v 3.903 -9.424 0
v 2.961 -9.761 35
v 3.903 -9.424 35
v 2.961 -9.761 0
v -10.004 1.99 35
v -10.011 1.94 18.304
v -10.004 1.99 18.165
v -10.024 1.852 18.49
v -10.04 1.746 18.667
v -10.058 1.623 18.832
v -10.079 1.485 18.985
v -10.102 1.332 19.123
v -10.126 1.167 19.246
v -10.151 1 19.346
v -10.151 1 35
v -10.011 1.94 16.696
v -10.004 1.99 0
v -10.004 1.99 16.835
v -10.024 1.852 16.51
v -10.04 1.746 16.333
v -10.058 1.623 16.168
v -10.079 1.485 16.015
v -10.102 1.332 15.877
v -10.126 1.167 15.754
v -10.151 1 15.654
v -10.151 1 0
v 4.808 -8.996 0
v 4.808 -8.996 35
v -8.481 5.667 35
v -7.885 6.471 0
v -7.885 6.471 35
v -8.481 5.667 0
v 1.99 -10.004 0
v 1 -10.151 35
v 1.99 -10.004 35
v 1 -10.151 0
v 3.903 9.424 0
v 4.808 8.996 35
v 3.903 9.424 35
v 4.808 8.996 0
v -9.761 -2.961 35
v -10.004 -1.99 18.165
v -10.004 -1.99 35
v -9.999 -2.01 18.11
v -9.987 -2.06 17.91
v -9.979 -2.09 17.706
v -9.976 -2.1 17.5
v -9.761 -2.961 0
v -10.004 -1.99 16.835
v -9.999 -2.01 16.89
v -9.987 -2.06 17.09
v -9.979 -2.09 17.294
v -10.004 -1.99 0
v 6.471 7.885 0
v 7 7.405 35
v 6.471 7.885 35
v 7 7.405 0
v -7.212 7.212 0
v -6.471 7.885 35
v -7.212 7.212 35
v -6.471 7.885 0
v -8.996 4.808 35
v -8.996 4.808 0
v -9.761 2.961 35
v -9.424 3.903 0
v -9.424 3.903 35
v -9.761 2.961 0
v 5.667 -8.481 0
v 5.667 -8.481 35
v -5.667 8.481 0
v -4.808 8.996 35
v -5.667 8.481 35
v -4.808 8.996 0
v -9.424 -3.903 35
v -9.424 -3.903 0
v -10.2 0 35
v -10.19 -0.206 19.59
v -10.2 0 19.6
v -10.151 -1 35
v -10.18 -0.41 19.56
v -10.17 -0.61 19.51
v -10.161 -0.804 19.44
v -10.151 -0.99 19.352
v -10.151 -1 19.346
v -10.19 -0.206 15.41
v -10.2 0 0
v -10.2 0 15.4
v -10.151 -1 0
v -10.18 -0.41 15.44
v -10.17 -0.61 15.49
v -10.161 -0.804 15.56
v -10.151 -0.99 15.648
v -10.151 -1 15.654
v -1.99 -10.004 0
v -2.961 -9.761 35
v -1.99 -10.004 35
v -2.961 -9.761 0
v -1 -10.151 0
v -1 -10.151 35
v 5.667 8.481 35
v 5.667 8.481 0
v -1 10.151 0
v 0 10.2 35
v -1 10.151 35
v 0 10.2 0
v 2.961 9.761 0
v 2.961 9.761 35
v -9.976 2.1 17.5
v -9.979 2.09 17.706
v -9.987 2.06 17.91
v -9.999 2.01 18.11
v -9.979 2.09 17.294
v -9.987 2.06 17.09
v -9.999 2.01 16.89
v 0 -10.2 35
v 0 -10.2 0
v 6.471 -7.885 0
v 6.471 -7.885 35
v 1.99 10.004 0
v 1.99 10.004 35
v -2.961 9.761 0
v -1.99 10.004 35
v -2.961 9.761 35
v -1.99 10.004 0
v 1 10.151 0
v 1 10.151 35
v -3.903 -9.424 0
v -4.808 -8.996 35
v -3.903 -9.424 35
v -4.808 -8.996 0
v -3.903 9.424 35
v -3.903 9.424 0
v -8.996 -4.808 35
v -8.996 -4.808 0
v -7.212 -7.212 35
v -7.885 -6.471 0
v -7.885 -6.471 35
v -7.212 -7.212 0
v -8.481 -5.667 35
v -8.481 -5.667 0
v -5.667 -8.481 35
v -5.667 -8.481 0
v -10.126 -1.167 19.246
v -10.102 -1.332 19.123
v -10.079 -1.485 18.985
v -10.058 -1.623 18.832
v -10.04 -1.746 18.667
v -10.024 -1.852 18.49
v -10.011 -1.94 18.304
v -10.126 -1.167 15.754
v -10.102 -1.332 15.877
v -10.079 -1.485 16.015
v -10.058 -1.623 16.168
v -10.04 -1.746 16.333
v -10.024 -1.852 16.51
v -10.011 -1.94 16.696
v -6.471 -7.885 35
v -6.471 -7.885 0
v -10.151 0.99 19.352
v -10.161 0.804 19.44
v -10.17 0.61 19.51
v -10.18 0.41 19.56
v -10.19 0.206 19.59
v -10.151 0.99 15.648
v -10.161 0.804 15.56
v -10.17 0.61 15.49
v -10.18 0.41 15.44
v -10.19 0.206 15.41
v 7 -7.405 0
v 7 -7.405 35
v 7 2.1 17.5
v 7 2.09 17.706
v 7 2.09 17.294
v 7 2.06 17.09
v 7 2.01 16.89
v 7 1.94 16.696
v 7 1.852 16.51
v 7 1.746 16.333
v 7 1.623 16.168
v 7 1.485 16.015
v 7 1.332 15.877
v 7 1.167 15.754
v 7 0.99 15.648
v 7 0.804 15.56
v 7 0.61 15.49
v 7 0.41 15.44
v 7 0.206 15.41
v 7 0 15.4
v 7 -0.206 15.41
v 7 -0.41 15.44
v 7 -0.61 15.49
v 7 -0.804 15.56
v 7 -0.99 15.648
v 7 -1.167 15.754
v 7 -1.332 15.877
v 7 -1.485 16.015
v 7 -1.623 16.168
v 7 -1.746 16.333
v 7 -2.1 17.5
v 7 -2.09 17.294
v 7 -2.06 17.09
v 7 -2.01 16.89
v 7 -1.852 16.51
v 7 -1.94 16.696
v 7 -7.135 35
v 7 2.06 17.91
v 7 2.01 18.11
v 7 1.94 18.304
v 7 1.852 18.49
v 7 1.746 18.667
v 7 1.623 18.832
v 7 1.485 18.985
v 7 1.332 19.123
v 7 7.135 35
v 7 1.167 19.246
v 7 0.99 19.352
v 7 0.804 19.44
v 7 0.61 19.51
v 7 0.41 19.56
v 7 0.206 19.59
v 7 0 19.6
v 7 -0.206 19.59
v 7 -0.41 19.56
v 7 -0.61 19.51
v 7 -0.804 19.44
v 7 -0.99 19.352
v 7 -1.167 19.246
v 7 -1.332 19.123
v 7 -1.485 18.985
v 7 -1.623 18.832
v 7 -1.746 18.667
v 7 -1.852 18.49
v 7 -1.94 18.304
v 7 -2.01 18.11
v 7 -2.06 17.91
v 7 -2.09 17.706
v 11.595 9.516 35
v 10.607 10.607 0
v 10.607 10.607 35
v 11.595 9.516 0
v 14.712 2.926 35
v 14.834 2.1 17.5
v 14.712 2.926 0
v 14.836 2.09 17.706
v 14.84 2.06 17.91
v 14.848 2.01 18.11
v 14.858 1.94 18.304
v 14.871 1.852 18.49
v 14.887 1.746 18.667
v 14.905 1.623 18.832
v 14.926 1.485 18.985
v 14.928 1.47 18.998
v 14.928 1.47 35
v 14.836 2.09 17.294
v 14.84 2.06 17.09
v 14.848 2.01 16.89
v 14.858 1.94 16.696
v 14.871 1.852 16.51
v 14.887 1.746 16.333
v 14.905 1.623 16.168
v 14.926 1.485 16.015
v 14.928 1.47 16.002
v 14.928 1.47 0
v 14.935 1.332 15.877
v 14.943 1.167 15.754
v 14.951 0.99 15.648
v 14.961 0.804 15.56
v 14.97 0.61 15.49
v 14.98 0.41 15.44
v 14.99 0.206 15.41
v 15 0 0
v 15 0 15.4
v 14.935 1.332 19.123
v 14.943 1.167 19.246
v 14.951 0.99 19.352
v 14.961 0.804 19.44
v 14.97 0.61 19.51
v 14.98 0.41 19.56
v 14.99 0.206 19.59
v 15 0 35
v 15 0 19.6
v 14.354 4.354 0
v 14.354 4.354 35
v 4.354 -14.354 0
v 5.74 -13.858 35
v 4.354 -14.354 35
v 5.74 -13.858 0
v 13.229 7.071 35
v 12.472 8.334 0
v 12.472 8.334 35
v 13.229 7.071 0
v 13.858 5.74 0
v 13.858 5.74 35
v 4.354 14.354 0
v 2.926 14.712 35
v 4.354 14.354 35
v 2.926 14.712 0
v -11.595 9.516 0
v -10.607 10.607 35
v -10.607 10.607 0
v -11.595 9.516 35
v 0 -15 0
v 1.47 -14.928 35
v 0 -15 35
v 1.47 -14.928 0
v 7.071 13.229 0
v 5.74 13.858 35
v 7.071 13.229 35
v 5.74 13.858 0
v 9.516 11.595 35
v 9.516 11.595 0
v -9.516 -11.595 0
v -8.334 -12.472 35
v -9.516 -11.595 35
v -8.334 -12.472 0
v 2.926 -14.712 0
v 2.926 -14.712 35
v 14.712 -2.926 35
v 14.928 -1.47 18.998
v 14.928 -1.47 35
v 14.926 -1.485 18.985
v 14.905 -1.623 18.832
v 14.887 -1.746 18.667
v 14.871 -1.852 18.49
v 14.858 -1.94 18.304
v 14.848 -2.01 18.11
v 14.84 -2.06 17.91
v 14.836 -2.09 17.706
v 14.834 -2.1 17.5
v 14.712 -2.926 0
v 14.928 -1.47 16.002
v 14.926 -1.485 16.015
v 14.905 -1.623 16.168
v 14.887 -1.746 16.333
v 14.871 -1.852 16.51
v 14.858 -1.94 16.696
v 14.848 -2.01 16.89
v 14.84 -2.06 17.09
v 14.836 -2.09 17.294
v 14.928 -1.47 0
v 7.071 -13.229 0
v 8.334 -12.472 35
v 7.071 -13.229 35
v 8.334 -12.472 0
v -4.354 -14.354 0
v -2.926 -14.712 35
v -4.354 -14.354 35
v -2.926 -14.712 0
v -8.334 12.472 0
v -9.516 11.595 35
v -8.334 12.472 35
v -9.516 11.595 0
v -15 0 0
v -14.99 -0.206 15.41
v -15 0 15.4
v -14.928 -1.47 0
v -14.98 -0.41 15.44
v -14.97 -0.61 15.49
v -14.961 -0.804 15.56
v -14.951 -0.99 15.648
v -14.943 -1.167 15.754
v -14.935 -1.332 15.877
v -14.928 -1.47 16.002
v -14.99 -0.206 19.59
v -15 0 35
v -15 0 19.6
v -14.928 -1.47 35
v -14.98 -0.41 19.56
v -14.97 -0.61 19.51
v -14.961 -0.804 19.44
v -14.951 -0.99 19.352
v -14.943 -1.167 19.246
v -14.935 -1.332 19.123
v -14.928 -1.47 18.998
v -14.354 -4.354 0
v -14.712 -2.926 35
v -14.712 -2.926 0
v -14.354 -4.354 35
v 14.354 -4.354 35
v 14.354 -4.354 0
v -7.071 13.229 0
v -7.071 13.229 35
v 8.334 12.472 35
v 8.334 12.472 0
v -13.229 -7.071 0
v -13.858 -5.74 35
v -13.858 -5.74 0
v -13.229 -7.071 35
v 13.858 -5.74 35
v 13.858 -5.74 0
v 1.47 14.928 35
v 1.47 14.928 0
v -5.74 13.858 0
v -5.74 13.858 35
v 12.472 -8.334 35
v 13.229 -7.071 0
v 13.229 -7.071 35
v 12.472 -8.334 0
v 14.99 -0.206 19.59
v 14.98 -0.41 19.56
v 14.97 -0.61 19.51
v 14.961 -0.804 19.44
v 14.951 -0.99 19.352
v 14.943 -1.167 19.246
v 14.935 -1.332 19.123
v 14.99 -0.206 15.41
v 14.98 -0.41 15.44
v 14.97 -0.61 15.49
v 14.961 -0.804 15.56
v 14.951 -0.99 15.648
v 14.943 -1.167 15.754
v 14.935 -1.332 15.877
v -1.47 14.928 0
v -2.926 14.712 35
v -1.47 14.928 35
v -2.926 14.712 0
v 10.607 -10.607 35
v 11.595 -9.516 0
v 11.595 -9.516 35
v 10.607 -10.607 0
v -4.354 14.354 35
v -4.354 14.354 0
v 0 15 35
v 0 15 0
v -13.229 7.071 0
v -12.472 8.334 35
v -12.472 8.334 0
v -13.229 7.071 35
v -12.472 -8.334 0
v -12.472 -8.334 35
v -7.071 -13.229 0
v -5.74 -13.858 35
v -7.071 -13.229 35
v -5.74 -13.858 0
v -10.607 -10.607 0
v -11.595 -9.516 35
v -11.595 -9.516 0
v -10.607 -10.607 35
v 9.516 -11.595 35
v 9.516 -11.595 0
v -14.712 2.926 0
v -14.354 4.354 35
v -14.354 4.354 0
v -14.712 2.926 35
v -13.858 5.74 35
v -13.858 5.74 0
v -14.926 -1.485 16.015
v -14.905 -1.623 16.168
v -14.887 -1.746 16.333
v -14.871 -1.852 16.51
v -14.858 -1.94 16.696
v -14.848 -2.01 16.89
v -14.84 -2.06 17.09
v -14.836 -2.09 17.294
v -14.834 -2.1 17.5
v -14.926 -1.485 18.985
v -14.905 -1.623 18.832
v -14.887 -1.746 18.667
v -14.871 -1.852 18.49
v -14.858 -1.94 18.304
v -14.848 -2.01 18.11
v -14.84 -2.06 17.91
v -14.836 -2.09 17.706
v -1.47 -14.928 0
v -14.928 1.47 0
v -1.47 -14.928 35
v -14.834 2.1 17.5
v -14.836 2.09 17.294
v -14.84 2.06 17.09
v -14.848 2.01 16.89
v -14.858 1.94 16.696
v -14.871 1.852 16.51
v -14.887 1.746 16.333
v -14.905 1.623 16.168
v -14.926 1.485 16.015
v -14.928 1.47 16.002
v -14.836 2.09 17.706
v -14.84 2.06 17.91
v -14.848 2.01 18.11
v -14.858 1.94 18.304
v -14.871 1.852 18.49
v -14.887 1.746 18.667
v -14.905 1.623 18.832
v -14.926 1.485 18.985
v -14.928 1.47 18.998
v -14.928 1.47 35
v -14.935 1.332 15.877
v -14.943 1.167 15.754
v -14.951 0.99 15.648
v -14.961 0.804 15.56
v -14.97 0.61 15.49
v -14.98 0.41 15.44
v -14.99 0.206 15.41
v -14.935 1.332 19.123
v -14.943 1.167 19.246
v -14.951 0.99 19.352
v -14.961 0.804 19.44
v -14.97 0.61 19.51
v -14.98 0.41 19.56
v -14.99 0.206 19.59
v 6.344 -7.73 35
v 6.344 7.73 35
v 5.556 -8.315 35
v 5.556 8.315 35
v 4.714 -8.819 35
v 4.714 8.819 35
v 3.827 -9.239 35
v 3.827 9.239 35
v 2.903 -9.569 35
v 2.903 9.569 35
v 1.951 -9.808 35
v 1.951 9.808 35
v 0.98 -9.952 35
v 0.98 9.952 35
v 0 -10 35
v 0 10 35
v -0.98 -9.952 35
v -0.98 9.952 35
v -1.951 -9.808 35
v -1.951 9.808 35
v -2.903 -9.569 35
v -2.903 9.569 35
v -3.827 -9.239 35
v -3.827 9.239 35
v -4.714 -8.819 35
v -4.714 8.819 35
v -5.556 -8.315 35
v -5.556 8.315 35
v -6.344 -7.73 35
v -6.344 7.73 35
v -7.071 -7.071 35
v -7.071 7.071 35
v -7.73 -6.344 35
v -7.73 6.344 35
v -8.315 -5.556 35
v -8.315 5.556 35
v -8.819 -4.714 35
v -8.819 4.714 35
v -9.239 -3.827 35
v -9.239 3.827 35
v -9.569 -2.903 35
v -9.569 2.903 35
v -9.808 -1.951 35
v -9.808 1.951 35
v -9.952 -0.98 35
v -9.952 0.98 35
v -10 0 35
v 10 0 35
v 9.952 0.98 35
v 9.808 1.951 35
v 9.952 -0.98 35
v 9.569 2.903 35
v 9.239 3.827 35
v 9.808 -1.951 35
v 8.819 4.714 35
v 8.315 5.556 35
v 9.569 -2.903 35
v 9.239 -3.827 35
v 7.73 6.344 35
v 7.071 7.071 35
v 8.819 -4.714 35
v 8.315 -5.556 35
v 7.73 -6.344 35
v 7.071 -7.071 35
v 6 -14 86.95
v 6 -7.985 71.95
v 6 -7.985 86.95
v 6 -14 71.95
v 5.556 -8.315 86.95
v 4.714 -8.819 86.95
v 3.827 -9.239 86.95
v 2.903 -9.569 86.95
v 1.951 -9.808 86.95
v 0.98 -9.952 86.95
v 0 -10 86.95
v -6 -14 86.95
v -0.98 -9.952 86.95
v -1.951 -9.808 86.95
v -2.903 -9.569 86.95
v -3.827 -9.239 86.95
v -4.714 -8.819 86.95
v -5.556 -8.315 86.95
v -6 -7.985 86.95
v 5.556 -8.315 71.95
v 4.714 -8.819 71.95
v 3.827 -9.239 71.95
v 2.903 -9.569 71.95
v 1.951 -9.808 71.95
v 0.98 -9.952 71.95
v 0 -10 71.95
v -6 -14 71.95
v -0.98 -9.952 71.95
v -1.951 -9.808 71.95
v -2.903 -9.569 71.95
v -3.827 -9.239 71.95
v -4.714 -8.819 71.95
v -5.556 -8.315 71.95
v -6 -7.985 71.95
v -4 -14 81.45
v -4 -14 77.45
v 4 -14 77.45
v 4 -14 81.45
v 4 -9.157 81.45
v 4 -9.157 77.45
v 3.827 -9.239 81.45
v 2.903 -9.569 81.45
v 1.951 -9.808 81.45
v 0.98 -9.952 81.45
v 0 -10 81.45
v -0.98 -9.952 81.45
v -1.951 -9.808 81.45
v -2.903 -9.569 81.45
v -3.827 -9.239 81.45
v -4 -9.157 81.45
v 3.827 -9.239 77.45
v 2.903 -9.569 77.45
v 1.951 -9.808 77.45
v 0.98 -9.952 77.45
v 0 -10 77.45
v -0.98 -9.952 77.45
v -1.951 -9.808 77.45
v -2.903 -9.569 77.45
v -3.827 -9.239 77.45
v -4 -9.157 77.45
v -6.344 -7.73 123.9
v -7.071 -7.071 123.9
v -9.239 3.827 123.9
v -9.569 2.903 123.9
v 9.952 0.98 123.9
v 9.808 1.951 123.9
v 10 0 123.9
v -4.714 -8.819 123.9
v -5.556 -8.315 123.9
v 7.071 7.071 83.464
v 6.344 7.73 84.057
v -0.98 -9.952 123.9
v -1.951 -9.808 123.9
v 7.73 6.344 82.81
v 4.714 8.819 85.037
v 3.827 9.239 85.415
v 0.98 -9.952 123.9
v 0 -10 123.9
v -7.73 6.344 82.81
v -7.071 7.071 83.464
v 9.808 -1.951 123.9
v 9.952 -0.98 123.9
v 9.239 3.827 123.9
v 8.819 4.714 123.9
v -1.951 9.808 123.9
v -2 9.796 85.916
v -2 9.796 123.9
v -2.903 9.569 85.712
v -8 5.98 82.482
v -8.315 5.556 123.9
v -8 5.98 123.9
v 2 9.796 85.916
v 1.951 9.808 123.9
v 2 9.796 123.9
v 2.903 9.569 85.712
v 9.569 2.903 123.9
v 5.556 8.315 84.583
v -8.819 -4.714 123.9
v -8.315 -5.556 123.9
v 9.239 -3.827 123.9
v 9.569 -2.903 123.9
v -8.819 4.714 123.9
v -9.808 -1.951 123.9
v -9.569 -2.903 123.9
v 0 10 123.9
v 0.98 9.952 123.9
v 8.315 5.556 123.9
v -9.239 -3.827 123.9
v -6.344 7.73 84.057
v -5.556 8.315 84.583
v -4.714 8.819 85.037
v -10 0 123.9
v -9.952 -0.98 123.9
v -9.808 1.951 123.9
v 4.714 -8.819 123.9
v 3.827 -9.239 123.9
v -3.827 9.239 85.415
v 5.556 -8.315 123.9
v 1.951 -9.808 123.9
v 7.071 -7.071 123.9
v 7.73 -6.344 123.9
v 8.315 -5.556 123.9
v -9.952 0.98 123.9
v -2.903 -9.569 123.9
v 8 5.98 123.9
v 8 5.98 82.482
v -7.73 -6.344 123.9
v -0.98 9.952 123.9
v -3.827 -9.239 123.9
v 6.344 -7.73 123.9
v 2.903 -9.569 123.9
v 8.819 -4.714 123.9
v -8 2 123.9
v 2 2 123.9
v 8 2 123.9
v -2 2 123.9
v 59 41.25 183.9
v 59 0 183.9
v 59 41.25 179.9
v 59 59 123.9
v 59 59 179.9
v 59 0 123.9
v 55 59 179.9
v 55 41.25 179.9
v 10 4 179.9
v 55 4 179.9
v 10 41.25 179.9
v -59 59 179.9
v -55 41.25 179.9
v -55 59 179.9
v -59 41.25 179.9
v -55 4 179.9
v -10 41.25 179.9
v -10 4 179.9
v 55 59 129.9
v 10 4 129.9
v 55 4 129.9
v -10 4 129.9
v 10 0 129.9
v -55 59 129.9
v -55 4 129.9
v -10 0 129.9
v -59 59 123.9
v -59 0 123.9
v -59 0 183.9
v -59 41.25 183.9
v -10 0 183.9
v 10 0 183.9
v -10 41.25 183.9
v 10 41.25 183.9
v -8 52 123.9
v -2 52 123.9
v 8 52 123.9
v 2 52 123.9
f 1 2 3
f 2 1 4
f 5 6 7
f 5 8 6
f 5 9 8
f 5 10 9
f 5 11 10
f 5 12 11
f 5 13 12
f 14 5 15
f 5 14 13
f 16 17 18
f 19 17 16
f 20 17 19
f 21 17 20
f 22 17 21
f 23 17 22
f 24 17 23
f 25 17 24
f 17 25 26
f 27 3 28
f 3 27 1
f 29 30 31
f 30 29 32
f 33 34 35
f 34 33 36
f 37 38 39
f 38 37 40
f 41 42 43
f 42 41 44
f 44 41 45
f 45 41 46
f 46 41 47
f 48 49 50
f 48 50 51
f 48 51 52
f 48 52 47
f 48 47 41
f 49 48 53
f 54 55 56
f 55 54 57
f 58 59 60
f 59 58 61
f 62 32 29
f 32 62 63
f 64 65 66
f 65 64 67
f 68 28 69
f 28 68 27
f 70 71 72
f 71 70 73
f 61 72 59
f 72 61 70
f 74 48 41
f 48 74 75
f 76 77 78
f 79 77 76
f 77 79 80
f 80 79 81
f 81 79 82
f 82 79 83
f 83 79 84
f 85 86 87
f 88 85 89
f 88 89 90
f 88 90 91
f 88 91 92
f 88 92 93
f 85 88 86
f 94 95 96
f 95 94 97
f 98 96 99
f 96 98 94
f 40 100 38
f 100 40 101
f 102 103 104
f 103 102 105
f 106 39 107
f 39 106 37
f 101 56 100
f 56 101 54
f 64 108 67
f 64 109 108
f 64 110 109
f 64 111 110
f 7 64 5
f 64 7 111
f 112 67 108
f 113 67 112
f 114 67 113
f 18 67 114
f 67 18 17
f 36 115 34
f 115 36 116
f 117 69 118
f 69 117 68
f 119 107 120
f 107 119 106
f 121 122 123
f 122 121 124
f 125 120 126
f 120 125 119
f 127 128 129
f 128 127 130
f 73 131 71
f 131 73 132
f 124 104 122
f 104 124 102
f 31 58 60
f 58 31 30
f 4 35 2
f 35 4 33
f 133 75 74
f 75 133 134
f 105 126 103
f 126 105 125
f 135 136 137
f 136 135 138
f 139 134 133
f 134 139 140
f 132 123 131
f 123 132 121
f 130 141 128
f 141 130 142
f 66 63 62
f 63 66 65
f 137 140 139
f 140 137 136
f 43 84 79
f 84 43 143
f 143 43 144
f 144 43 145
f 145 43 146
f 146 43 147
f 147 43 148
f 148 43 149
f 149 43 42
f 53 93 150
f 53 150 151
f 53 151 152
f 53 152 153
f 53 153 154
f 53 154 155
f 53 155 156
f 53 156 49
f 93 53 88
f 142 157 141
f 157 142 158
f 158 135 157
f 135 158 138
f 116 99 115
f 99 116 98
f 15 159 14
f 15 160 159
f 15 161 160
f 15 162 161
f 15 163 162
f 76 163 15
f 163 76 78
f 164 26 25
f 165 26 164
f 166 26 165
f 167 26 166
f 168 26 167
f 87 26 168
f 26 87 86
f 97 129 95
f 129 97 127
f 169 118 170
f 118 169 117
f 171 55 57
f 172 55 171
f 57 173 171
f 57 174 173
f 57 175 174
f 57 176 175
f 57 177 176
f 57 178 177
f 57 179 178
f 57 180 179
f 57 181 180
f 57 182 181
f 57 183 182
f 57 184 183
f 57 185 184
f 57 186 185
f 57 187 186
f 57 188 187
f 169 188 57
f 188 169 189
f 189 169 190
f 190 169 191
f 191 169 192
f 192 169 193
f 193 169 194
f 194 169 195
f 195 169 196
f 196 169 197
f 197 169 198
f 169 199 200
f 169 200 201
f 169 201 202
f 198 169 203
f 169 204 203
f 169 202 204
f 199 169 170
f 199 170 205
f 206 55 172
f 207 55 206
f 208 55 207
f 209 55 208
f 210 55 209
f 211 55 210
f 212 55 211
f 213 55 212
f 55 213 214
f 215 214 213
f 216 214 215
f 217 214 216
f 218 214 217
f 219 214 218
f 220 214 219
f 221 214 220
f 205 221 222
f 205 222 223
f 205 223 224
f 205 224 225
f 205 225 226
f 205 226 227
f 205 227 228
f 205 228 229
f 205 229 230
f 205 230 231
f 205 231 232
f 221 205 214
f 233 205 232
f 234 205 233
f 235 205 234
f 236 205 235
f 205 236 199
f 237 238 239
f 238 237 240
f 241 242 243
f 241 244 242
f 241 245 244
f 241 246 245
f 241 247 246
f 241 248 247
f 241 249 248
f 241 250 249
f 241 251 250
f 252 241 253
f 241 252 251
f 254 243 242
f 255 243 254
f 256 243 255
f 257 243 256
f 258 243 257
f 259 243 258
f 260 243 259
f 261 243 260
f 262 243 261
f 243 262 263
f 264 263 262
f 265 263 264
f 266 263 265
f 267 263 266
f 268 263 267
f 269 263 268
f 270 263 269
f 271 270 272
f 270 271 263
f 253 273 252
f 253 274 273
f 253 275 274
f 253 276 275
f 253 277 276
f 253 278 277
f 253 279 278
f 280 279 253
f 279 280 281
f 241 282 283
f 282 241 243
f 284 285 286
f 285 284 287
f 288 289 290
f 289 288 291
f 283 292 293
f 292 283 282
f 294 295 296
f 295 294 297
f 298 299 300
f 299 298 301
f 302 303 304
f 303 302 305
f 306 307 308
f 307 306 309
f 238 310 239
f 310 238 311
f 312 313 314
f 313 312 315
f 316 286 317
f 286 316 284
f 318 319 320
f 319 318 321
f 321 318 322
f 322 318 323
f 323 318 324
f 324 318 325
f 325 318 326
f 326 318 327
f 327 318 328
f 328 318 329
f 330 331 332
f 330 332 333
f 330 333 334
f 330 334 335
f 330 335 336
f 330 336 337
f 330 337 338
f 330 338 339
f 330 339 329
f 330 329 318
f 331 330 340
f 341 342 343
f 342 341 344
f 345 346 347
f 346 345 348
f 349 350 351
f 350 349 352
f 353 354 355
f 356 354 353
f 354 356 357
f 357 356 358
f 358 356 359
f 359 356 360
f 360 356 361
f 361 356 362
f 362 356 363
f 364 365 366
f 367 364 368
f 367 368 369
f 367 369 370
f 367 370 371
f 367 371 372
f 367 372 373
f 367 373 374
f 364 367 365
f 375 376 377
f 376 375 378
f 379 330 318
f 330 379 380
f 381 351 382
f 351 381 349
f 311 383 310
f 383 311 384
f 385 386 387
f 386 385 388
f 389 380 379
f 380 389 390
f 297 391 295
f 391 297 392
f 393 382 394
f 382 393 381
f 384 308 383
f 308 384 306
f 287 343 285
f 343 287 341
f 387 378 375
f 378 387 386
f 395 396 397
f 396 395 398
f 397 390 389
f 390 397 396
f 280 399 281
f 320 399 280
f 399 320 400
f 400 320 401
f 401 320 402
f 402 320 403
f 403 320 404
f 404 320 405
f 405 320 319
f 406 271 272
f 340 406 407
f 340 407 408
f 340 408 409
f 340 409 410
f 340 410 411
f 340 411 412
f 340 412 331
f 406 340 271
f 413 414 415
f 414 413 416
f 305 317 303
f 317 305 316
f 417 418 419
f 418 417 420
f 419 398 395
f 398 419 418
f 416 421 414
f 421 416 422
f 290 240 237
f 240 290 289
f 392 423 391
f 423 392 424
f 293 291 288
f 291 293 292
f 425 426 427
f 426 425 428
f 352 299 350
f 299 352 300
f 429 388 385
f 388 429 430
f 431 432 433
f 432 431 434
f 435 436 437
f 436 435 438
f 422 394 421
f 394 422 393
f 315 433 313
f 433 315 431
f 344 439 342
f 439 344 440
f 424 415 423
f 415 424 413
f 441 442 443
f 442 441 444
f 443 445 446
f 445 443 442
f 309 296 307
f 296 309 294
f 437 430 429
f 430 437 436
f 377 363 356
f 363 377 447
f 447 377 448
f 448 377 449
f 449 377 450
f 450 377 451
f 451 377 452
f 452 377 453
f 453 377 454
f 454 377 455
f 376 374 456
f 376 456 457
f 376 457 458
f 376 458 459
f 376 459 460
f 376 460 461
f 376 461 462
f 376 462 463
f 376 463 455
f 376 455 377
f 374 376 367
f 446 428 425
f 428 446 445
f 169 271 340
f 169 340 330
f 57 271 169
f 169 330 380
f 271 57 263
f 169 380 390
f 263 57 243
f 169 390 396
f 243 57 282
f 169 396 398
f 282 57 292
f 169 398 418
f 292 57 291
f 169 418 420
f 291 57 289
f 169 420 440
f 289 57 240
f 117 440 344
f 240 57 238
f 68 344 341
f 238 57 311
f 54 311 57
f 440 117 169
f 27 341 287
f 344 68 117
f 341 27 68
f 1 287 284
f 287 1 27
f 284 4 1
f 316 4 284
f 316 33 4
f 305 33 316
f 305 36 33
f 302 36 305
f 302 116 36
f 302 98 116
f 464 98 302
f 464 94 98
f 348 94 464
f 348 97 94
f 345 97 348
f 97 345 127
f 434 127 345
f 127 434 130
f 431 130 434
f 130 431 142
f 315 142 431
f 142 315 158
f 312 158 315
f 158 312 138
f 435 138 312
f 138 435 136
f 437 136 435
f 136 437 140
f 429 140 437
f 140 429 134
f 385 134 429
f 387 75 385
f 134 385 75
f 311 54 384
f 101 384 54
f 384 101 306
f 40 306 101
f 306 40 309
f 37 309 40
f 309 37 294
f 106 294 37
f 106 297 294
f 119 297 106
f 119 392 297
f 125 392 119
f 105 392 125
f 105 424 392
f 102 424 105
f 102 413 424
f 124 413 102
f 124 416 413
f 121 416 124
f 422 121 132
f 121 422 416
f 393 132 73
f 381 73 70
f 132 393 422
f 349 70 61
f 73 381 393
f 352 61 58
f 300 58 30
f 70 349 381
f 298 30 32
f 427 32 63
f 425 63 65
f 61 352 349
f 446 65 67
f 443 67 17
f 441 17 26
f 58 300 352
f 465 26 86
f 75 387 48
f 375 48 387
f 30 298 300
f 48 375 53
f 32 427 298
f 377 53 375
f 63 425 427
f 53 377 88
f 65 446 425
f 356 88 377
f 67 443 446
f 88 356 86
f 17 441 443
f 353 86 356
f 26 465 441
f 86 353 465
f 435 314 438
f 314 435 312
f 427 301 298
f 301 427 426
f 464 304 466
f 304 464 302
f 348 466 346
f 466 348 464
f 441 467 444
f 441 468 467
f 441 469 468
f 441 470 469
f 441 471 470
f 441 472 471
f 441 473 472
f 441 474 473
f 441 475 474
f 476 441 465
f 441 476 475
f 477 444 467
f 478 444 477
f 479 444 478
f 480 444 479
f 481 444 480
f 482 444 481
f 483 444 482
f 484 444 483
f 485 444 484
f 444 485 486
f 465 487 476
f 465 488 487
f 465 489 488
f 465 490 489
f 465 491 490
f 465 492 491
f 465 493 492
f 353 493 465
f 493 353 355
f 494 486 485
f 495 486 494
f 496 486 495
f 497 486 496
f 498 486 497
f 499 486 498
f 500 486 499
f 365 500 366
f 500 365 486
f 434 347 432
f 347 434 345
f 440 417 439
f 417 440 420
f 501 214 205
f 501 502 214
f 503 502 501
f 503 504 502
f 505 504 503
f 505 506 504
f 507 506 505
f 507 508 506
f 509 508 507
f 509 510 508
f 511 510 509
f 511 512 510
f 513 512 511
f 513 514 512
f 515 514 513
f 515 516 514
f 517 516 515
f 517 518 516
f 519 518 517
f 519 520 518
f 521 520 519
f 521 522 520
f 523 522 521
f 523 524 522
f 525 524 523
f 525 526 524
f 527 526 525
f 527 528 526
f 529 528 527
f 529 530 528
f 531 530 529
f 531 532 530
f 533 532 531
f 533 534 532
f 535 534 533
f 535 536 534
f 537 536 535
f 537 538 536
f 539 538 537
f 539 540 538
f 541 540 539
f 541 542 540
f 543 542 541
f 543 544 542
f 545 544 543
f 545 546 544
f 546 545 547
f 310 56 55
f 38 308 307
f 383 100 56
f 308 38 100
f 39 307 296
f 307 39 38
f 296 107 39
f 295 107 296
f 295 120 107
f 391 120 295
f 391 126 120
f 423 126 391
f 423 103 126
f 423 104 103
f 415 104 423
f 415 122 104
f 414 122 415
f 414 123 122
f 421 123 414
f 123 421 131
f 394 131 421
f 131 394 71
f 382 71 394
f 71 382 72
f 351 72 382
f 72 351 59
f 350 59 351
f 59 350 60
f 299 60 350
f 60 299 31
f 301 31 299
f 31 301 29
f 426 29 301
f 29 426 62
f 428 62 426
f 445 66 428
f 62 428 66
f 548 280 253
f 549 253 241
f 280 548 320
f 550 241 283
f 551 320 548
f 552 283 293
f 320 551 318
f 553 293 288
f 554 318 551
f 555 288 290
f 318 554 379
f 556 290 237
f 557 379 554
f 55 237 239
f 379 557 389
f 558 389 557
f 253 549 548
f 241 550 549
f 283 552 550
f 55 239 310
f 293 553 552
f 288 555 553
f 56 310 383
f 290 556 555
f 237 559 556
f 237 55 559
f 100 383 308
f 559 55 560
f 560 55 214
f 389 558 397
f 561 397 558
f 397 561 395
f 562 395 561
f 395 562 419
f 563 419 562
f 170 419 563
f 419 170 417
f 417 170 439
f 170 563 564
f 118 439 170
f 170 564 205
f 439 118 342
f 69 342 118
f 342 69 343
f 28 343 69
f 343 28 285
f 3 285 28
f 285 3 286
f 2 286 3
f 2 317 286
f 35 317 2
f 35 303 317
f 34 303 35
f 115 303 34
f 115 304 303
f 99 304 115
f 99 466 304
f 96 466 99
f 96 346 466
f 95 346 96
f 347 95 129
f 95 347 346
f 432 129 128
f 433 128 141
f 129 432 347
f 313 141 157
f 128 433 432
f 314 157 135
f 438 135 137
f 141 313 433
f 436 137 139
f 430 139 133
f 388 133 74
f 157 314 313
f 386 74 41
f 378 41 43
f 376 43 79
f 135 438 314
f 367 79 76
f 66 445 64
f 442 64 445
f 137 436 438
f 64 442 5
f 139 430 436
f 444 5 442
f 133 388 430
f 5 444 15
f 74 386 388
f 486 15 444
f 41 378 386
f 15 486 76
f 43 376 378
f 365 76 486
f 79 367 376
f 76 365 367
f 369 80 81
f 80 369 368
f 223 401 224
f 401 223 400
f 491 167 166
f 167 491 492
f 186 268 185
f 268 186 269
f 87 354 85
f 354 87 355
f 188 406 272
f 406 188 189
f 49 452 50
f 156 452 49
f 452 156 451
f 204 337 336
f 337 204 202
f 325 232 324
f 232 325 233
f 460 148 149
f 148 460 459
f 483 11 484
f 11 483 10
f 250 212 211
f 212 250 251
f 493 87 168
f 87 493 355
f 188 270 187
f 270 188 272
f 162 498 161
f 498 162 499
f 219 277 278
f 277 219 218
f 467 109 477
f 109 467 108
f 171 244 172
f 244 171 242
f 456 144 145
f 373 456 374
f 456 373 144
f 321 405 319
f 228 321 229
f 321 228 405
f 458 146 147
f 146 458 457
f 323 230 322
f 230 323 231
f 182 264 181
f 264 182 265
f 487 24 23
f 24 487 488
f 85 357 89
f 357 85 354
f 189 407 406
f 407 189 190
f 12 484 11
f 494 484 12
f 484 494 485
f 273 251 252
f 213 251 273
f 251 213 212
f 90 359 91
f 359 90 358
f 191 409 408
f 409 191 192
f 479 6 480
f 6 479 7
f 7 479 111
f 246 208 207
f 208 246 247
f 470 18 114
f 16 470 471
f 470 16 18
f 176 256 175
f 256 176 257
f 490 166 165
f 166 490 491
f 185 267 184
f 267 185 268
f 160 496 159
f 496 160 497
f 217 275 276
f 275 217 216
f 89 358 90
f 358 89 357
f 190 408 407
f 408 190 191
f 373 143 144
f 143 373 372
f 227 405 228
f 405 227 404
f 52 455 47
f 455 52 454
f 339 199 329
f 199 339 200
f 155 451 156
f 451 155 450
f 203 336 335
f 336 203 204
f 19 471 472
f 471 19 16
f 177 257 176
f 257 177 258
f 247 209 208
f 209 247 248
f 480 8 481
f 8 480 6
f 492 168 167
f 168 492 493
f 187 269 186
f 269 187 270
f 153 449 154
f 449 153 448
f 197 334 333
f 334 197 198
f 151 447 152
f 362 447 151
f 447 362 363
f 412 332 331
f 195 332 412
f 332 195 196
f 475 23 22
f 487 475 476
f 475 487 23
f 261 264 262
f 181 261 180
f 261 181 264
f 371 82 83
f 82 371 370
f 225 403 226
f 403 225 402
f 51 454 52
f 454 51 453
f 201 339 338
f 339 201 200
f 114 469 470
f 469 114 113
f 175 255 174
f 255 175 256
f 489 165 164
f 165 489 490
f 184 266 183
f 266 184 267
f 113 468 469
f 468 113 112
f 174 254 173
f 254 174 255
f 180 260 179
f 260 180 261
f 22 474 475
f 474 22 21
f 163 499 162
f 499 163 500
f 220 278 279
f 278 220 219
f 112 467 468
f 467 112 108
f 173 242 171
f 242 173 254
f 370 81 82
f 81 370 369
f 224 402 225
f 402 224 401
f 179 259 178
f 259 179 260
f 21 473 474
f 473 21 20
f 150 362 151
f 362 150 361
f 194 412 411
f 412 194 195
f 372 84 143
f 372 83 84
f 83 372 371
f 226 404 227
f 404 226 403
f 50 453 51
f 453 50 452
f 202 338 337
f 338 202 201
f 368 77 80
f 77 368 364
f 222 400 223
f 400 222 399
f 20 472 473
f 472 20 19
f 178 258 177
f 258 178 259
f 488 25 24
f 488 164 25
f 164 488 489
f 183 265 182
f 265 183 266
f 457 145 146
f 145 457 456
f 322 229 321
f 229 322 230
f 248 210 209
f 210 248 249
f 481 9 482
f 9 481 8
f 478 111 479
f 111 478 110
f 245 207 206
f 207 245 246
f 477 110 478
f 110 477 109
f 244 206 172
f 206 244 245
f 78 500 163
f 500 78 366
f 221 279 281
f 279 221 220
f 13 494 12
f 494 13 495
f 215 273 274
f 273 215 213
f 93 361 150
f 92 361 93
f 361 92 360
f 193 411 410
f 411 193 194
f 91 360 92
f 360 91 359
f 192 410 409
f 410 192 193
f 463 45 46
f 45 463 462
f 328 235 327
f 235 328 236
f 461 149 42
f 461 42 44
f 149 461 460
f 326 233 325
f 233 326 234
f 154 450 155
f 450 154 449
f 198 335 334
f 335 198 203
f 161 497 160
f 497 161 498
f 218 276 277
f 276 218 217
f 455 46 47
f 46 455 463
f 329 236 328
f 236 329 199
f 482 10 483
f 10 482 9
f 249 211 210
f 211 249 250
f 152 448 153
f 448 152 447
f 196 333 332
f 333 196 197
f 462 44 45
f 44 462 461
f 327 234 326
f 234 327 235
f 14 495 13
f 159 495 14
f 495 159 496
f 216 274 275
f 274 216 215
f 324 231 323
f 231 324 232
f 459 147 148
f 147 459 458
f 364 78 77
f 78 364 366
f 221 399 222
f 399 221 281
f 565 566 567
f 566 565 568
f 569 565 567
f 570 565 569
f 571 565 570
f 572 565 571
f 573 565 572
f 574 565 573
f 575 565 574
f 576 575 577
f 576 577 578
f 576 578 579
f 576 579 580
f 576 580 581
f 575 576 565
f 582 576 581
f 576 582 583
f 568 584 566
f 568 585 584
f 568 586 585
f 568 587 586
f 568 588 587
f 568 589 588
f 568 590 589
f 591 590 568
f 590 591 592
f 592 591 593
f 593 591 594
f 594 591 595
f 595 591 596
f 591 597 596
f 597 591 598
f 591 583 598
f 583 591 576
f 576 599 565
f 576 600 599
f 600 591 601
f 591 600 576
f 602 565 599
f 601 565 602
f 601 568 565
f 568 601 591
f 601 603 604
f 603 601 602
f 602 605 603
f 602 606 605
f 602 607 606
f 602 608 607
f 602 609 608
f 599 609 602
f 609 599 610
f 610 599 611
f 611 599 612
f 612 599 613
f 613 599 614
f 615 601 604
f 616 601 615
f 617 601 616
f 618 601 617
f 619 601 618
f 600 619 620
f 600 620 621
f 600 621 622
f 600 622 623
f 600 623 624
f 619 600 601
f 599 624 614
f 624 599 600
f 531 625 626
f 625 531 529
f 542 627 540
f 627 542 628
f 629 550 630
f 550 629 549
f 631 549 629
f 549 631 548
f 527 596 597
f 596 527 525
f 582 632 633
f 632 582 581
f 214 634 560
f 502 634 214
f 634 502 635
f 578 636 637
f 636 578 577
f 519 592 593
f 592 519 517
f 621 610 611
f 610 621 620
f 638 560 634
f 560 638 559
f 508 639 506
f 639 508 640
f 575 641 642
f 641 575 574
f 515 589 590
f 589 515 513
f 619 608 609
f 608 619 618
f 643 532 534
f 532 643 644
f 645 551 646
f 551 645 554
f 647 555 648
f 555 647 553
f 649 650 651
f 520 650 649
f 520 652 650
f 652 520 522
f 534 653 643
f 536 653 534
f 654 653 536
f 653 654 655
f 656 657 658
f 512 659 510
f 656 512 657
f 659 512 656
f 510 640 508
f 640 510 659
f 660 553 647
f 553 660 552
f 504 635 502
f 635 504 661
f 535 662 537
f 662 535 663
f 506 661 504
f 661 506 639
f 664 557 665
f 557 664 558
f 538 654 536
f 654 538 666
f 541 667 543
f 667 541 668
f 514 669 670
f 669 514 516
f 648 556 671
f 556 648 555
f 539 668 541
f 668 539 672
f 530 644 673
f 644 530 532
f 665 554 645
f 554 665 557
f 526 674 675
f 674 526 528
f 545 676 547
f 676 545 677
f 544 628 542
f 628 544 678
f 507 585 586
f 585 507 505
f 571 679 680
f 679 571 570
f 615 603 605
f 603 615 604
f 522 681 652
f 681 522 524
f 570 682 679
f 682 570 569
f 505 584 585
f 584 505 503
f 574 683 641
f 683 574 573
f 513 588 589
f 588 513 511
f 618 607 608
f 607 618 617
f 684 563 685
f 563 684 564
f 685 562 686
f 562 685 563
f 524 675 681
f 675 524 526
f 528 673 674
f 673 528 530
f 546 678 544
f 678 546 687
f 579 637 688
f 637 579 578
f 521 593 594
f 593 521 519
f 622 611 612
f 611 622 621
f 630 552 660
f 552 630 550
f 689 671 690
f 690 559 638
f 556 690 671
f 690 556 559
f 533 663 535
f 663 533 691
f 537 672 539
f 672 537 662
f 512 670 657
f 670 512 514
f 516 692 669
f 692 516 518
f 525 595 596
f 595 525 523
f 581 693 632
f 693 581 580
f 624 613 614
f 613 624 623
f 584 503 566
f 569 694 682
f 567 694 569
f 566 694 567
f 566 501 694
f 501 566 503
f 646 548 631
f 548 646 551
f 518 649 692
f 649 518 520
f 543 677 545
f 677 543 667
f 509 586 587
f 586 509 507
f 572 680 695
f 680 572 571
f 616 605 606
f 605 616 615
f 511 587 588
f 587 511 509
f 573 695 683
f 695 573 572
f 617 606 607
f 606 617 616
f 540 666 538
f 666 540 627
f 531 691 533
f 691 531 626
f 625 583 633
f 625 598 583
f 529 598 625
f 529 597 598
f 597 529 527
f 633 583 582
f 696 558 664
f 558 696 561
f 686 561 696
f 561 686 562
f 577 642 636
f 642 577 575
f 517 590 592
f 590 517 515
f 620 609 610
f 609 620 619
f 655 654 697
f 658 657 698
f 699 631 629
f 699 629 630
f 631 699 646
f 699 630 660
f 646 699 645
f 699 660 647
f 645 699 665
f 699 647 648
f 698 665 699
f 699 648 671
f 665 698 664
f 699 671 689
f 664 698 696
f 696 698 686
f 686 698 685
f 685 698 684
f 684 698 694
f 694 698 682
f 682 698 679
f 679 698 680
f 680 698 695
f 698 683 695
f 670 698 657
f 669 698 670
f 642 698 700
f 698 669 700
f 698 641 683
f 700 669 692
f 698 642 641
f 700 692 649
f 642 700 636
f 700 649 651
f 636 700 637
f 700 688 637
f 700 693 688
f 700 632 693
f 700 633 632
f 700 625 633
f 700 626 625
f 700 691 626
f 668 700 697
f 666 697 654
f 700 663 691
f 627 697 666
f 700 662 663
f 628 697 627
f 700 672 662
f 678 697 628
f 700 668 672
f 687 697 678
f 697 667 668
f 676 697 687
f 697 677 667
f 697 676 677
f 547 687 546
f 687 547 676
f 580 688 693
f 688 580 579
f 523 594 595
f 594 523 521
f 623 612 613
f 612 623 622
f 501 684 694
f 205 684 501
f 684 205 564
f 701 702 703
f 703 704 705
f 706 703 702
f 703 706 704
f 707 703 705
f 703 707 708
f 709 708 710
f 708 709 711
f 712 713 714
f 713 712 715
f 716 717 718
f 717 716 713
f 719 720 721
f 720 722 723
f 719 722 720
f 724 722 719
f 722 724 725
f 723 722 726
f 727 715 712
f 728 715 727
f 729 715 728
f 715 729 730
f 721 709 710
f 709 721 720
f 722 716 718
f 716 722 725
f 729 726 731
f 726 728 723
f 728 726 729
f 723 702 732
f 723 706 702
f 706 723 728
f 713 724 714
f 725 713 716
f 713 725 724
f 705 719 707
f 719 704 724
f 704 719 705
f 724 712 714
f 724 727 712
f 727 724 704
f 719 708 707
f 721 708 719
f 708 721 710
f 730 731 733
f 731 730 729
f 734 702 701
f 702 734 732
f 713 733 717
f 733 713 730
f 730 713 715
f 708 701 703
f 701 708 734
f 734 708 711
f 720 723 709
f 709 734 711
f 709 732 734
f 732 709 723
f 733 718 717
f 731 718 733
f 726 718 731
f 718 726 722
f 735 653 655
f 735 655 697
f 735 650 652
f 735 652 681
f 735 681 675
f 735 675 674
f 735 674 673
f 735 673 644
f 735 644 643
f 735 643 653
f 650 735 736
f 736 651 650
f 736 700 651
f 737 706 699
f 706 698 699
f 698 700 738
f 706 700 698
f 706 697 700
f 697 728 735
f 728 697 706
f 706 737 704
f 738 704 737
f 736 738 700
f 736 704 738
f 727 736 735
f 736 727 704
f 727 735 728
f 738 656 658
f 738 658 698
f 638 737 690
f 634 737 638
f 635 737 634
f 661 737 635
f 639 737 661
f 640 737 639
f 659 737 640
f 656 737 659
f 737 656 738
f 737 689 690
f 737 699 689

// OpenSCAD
// FILE: 24_Webcam_Cage_Keyed_D_Socket.scad
// Sized for: Large webcams (up to 11cm wide)
// KEYED: Added internal D-Socket to match the 20mm Mast D-cut.
// FEATURES: 50mm walls, 75% roof, Drop-in wire channel.

$fn = 64;
mm = 25.4;

// --- DIMENSIONS ---
mast_dia       = 20;      
socket_depth   = 35;      
clearance_h    = 3.5 * mm; // Shortened slightly per previous request for better proportions

// --- BALCONY/BOX SPECS ---
balcony_w    = 110;       
balcony_d    = 55;        
wall_h       = 50;        
wall_t       = 4;         
floor_t      = 6;         

// --- ROOF & CHANNEL SPECS ---
roof_coverage = 0.75;     
channel_w     = 20;       

// ============================================================
// RENDER
// ============================================================
union() {
    // 1. THE KEYED MAST SOCKET (Females onto 20mm Mast)
    difference() {
        color("Gold") cylinder(h = socket_depth, d = mast_dia + 10);
        
        // Internal D-Hole Logic
        translate([0, 0, -1]) {
            difference() {
                // Round hole with 0.4mm tolerance
                cylinder(h = socket_depth + 2, d = mast_dia + 0.4);
                
                // The D-Flat "Wall"
                // Matches a 3mm cut on the 20mm mast (10mm radius - 3mm = 7mm from center)
                translate([mast_dia/2 - 3, -mast_dia, 0]) 
                    cube([10, mast_dia*2, socket_depth + 5]);
            }
        }
        
        // M4 Set-screw hole for absolute safety
        translate([0, 0, socket_depth / 2]) rotate([0, 90, 0]) 
            cylinder(h = mast_dia + 20, d = 4.2, center=true);
    }

    // 2. THE EXTENSION STEM
    color("Gold") translate([0, 0, socket_depth]) {
        cylinder(h = clearance_h, d = mast_dia);
        
        // CABLE TIE HUB (On the back)
        translate([0, -mast_dia/2, clearance_h/2]) {
            difference() {
                color("Silver") cube([12, 8, 15], center=true);
                cube([8, 12, 4], center=true);
            }
        }
    }

    // 3. THE DEEP CAMERA CAGE
    translate([0, 0, socket_depth + clearance_h]) {
        union() {
            // FLOOR
            color("Silver") translate([-balcony_w/2 - wall_t, 0, 0]) 
                cube([balcony_w + (wall_t*2), balcony_d + wall_t, floor_t]);
            
            // WALLS & ROOF
            color("DimGray") translate([0, 0, floor_t]) {
                difference() {
                    union() {
                        // Back Wall
                        translate([-balcony_w/2 - wall_t, 0, 0]) 
                            cube([balcony_w + (wall_t*2), wall_t, wall_h]);
                        // Left Wall
                        translate([-balcony_w/2 - wall_t, 0, 0]) 
                            cube([wall_t, balcony_d + wall_t, wall_h]);
                        // Right Wall
                        translate([balcony_w/2, 0, 0]) 
                            cube([wall_t, balcony_d + wall_t, wall_h]);
                        
                        // THE ROOF (75% Coverage)
                        translate([-balcony_w/2 - wall_t, 0, wall_h])
                            cube([balcony_w + (wall_t*2), balcony_d * roof_coverage, wall_t]);
                    }
                    
                    // THE U-CHANNEL (Drops through back wall and roof)
                    translate([-channel_w/2, -1, -1]) 
                        cube([channel_w, balcony_d + 2, wall_h + wall_t + 2]);
                }
            }

            // --- REINFORCEMENT GUSSETS (Fused to Rod) ---
            for(x_pos = [-8, 2]) { 
                translate([x_pos, 2, 0]) 
                rotate([90, 0, 90]) 
                linear_extrude(6)
                polygon([
                    [0, 0],             
                    [0, -45],           
                    [balcony_d - 5, 0]  
                ]);
            }
        }
    }
}
